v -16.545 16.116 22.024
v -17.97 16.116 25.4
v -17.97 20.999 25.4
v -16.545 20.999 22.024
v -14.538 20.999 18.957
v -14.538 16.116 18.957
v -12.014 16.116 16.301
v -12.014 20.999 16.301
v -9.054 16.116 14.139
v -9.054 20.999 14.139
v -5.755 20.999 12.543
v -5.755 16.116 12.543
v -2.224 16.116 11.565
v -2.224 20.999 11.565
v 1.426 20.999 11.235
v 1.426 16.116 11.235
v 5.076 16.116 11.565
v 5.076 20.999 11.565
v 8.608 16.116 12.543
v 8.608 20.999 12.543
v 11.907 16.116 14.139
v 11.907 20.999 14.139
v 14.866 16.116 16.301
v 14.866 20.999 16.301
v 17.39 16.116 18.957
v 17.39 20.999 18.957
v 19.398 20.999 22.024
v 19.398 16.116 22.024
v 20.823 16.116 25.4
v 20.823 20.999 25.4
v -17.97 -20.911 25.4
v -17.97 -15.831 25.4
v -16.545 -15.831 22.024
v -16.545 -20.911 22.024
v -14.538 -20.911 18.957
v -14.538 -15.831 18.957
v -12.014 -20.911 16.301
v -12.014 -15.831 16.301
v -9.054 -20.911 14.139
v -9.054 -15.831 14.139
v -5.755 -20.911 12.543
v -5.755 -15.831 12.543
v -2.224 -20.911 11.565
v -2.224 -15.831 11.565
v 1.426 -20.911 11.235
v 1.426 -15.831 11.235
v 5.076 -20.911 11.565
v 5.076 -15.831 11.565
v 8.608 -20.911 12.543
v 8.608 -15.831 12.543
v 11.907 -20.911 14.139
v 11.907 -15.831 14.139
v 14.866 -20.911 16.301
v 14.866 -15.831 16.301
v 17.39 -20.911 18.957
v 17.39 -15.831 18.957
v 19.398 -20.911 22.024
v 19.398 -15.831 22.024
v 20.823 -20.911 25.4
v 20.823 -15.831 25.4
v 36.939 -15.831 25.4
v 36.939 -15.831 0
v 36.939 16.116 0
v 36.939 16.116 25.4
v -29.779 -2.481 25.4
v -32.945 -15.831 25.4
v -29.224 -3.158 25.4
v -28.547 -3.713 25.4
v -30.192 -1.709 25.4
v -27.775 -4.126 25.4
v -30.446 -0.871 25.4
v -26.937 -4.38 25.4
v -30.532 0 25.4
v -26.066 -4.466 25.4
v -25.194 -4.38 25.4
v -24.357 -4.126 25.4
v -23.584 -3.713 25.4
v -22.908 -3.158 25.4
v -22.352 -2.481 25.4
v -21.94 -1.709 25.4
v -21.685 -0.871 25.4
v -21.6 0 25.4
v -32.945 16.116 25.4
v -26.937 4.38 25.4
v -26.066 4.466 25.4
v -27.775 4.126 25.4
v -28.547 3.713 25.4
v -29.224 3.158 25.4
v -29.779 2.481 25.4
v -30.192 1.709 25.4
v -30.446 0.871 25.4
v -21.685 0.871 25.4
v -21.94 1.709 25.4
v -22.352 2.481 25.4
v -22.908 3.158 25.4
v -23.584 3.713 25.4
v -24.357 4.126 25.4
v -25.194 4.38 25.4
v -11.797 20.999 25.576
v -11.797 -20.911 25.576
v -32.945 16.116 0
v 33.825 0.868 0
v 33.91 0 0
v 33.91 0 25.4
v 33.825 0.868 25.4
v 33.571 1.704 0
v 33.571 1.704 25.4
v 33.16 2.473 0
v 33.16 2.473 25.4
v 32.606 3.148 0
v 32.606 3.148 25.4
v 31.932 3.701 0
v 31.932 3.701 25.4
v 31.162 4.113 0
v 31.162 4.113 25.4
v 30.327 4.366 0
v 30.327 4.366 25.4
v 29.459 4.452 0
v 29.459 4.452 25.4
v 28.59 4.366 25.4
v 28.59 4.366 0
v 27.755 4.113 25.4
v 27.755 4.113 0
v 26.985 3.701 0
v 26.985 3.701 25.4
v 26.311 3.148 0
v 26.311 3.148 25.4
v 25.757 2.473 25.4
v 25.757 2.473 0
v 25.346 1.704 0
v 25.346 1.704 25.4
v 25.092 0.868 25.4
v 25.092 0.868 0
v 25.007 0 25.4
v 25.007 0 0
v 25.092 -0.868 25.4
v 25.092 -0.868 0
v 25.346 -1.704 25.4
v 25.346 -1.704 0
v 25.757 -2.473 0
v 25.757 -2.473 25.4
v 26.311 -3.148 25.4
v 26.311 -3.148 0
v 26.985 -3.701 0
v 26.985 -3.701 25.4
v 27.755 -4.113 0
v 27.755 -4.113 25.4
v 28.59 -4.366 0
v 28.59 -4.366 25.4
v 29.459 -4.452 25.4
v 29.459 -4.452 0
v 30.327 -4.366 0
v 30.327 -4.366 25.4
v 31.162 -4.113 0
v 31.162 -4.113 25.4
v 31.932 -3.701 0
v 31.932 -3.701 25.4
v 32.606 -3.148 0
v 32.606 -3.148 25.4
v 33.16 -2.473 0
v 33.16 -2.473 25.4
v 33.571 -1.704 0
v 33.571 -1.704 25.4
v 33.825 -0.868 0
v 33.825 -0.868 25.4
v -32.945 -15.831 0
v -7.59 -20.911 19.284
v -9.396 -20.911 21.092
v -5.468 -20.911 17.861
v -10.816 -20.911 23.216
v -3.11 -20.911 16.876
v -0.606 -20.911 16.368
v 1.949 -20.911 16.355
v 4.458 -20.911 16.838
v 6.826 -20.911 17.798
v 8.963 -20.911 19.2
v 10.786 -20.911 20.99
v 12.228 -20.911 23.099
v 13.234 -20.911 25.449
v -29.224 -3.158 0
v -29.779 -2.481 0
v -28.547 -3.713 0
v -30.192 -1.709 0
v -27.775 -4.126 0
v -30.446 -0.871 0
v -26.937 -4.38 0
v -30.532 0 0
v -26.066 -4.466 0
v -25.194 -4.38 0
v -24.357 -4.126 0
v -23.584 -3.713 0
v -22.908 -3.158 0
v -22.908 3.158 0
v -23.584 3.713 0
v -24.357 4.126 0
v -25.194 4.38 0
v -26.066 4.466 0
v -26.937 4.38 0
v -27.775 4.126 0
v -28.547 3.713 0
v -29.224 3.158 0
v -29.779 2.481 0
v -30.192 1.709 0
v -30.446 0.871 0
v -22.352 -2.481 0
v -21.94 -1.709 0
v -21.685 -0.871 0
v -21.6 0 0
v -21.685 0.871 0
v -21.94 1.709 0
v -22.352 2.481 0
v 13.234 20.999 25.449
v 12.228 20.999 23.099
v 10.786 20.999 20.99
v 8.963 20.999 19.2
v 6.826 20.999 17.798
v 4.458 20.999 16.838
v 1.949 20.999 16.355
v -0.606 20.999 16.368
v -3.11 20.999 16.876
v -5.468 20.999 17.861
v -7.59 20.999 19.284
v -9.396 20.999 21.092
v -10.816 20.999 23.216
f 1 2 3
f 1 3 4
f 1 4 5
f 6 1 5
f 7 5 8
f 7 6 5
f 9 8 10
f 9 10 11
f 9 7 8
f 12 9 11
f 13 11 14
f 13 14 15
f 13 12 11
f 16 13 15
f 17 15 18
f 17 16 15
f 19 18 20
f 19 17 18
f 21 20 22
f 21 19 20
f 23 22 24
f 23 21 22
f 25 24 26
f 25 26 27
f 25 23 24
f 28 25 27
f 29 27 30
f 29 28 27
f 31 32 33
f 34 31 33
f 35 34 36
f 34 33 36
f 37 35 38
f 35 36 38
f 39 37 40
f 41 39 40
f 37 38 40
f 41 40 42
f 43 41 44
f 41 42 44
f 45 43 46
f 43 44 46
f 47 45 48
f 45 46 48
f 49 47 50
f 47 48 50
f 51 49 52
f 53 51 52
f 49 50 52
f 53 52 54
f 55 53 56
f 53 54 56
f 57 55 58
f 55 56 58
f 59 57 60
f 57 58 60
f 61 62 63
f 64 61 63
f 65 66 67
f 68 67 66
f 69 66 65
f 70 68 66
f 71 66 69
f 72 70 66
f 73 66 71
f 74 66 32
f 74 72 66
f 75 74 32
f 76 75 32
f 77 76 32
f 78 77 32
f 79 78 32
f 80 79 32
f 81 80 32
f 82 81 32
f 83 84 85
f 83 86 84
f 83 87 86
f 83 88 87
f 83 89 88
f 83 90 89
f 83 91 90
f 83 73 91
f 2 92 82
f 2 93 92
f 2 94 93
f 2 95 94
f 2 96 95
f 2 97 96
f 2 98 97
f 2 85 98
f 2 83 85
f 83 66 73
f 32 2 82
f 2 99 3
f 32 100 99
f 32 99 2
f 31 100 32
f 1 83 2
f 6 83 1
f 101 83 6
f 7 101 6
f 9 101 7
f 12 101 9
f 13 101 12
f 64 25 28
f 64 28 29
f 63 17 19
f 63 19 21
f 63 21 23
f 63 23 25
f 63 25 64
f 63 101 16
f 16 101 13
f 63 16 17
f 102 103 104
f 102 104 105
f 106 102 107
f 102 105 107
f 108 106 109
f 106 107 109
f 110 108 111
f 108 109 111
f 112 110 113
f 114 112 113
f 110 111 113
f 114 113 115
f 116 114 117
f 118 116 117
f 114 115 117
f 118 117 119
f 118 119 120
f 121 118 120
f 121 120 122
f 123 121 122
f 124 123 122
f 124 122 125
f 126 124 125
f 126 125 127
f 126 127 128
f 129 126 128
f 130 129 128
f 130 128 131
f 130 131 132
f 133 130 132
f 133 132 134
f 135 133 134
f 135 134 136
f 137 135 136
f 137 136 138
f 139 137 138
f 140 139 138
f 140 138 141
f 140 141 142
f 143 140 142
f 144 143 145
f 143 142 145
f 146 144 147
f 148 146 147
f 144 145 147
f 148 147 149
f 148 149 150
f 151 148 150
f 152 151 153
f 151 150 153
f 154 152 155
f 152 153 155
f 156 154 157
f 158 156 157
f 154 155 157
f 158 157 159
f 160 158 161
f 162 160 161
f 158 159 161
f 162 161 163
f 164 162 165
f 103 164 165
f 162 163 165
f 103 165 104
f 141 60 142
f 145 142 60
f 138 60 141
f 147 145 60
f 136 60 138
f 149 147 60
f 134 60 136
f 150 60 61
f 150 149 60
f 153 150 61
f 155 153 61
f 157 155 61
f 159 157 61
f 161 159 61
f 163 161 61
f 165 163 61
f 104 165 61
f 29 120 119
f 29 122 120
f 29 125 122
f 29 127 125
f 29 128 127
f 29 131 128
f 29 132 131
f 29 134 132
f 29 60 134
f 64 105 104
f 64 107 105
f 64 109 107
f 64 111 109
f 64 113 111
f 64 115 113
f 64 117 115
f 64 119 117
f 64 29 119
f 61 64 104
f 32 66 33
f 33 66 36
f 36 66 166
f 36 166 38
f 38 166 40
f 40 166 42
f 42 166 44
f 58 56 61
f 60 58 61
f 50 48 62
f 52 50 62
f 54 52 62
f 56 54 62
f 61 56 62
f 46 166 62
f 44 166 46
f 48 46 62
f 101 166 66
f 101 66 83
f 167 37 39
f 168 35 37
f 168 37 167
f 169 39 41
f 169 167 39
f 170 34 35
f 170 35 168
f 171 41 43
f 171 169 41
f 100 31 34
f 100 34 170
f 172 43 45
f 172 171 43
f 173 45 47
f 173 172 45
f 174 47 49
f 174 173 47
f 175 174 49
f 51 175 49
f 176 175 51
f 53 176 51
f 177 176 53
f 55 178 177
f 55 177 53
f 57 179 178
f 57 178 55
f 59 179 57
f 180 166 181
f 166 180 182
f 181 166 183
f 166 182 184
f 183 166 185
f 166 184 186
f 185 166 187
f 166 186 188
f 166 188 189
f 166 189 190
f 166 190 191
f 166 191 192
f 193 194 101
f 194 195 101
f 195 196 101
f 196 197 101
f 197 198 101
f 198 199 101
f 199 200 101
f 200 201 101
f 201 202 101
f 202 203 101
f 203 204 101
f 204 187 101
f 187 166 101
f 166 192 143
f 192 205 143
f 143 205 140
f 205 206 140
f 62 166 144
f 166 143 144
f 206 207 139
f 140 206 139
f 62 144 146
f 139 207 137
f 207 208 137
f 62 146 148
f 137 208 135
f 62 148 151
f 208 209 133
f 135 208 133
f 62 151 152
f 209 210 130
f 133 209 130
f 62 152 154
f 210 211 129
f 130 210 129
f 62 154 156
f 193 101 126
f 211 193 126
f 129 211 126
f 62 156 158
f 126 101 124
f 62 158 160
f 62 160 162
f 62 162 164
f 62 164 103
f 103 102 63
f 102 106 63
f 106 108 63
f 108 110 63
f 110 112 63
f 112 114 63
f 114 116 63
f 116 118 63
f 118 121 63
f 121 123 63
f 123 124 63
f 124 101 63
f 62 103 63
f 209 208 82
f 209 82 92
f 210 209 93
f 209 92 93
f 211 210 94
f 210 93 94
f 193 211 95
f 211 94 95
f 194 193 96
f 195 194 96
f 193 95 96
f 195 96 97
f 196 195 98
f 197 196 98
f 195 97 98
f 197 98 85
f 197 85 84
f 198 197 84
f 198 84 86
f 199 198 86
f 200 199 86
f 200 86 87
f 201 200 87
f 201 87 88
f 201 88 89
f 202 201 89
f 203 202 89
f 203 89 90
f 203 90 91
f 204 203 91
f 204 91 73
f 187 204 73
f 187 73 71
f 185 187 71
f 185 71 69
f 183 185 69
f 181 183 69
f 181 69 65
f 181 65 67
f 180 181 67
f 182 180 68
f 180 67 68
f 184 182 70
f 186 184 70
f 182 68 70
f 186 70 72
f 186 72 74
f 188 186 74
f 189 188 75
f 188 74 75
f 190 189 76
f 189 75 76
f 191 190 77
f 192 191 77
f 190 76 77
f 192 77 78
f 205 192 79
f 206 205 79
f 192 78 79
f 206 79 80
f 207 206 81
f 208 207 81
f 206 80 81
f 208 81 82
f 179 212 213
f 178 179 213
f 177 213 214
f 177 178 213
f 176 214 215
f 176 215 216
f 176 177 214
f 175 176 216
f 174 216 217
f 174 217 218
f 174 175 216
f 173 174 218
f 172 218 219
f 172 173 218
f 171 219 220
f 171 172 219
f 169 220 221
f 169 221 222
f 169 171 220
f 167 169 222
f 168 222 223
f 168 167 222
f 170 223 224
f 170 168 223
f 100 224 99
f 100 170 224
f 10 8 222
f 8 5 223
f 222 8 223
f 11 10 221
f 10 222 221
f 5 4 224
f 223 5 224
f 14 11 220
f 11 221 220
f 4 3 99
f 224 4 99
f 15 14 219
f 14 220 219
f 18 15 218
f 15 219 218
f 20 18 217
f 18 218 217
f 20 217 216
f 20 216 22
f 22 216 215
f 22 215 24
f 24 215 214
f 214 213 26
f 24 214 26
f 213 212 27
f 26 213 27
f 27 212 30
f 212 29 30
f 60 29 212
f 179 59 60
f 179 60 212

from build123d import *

# Parameters (mm, degrees)
F0_W          = 69.8839575052
F0_H          = 31.9469533861
F1_DEPTH      = 25.4
F3_DEPTH      = 31.9479533861
F5_DEPTH      = 5.08
F5_DEPTH_BACK = 36.83
F6_R          = 4.4661221371
F6_R_2        = 4.4516987215
F7_DEPTH      = 25.401


with BuildPart() as f1:
    # F0 (on Top) → F1 (new body)
    with BuildSketch(Plane.XY):
        with Locations((1.9966848195, 0.1426208764)):
            Rectangle(F0_W, F0_H)
    extrude(amount=F1_DEPTH)

    # F2 (on face) → F3 (cut, through all)
    with BuildSketch(Plane.XZ.offset(15.8308558166)):
        with BuildLine():
            Line((20.8225678653, 25.4), (-17.9701615125, 25.4))
            ThreePointArc((-17.9701615125, 25.4), (1.4262031764, 11.2350146431), (20.8225678653, 25.4))
        make_face()
    extrude(amount=-F3_DEPTH, mode=Mode.SUBTRACT)

    # F4 (on face) → F5 (join, two sides)
    with BuildSketch(Plane.XZ.offset(15.8308558166)) as f5_sk:
        with BuildLine():
            ThreePointArc((13.2335545495, 25.4485774785), (0.671350591, 16.2987194564), (-11.7973163724, 25.5756378174))
            Line((-11.7973163724, 25.5756378174), (-17.9701615125, 25.4))
            ThreePointArc((-17.9701615125, 25.4), (1.4262031764, 11.2350146431), (20.8225678653, 25.4))
            Line((20.8225678653, 25.4), (13.2335545495, 25.4485774785))
        make_face()
    extrude(amount=F5_DEPTH)
    extrude(f5_sk.sketch, amount=-F5_DEPTH_BACK)

    # F6 (on face) → F7 (cut, through all)
    with BuildSketch(Plane.XY.offset(25.4)):
        with Locations((-26.0657016188, 0)):
            Circle(F6_R)
        with Locations((29.4586159289, 0)):
            Circle(F6_R_2)
    extrude(amount=-F7_DEPTH, mode=Mode.SUBTRACT)


solid = f1.part
